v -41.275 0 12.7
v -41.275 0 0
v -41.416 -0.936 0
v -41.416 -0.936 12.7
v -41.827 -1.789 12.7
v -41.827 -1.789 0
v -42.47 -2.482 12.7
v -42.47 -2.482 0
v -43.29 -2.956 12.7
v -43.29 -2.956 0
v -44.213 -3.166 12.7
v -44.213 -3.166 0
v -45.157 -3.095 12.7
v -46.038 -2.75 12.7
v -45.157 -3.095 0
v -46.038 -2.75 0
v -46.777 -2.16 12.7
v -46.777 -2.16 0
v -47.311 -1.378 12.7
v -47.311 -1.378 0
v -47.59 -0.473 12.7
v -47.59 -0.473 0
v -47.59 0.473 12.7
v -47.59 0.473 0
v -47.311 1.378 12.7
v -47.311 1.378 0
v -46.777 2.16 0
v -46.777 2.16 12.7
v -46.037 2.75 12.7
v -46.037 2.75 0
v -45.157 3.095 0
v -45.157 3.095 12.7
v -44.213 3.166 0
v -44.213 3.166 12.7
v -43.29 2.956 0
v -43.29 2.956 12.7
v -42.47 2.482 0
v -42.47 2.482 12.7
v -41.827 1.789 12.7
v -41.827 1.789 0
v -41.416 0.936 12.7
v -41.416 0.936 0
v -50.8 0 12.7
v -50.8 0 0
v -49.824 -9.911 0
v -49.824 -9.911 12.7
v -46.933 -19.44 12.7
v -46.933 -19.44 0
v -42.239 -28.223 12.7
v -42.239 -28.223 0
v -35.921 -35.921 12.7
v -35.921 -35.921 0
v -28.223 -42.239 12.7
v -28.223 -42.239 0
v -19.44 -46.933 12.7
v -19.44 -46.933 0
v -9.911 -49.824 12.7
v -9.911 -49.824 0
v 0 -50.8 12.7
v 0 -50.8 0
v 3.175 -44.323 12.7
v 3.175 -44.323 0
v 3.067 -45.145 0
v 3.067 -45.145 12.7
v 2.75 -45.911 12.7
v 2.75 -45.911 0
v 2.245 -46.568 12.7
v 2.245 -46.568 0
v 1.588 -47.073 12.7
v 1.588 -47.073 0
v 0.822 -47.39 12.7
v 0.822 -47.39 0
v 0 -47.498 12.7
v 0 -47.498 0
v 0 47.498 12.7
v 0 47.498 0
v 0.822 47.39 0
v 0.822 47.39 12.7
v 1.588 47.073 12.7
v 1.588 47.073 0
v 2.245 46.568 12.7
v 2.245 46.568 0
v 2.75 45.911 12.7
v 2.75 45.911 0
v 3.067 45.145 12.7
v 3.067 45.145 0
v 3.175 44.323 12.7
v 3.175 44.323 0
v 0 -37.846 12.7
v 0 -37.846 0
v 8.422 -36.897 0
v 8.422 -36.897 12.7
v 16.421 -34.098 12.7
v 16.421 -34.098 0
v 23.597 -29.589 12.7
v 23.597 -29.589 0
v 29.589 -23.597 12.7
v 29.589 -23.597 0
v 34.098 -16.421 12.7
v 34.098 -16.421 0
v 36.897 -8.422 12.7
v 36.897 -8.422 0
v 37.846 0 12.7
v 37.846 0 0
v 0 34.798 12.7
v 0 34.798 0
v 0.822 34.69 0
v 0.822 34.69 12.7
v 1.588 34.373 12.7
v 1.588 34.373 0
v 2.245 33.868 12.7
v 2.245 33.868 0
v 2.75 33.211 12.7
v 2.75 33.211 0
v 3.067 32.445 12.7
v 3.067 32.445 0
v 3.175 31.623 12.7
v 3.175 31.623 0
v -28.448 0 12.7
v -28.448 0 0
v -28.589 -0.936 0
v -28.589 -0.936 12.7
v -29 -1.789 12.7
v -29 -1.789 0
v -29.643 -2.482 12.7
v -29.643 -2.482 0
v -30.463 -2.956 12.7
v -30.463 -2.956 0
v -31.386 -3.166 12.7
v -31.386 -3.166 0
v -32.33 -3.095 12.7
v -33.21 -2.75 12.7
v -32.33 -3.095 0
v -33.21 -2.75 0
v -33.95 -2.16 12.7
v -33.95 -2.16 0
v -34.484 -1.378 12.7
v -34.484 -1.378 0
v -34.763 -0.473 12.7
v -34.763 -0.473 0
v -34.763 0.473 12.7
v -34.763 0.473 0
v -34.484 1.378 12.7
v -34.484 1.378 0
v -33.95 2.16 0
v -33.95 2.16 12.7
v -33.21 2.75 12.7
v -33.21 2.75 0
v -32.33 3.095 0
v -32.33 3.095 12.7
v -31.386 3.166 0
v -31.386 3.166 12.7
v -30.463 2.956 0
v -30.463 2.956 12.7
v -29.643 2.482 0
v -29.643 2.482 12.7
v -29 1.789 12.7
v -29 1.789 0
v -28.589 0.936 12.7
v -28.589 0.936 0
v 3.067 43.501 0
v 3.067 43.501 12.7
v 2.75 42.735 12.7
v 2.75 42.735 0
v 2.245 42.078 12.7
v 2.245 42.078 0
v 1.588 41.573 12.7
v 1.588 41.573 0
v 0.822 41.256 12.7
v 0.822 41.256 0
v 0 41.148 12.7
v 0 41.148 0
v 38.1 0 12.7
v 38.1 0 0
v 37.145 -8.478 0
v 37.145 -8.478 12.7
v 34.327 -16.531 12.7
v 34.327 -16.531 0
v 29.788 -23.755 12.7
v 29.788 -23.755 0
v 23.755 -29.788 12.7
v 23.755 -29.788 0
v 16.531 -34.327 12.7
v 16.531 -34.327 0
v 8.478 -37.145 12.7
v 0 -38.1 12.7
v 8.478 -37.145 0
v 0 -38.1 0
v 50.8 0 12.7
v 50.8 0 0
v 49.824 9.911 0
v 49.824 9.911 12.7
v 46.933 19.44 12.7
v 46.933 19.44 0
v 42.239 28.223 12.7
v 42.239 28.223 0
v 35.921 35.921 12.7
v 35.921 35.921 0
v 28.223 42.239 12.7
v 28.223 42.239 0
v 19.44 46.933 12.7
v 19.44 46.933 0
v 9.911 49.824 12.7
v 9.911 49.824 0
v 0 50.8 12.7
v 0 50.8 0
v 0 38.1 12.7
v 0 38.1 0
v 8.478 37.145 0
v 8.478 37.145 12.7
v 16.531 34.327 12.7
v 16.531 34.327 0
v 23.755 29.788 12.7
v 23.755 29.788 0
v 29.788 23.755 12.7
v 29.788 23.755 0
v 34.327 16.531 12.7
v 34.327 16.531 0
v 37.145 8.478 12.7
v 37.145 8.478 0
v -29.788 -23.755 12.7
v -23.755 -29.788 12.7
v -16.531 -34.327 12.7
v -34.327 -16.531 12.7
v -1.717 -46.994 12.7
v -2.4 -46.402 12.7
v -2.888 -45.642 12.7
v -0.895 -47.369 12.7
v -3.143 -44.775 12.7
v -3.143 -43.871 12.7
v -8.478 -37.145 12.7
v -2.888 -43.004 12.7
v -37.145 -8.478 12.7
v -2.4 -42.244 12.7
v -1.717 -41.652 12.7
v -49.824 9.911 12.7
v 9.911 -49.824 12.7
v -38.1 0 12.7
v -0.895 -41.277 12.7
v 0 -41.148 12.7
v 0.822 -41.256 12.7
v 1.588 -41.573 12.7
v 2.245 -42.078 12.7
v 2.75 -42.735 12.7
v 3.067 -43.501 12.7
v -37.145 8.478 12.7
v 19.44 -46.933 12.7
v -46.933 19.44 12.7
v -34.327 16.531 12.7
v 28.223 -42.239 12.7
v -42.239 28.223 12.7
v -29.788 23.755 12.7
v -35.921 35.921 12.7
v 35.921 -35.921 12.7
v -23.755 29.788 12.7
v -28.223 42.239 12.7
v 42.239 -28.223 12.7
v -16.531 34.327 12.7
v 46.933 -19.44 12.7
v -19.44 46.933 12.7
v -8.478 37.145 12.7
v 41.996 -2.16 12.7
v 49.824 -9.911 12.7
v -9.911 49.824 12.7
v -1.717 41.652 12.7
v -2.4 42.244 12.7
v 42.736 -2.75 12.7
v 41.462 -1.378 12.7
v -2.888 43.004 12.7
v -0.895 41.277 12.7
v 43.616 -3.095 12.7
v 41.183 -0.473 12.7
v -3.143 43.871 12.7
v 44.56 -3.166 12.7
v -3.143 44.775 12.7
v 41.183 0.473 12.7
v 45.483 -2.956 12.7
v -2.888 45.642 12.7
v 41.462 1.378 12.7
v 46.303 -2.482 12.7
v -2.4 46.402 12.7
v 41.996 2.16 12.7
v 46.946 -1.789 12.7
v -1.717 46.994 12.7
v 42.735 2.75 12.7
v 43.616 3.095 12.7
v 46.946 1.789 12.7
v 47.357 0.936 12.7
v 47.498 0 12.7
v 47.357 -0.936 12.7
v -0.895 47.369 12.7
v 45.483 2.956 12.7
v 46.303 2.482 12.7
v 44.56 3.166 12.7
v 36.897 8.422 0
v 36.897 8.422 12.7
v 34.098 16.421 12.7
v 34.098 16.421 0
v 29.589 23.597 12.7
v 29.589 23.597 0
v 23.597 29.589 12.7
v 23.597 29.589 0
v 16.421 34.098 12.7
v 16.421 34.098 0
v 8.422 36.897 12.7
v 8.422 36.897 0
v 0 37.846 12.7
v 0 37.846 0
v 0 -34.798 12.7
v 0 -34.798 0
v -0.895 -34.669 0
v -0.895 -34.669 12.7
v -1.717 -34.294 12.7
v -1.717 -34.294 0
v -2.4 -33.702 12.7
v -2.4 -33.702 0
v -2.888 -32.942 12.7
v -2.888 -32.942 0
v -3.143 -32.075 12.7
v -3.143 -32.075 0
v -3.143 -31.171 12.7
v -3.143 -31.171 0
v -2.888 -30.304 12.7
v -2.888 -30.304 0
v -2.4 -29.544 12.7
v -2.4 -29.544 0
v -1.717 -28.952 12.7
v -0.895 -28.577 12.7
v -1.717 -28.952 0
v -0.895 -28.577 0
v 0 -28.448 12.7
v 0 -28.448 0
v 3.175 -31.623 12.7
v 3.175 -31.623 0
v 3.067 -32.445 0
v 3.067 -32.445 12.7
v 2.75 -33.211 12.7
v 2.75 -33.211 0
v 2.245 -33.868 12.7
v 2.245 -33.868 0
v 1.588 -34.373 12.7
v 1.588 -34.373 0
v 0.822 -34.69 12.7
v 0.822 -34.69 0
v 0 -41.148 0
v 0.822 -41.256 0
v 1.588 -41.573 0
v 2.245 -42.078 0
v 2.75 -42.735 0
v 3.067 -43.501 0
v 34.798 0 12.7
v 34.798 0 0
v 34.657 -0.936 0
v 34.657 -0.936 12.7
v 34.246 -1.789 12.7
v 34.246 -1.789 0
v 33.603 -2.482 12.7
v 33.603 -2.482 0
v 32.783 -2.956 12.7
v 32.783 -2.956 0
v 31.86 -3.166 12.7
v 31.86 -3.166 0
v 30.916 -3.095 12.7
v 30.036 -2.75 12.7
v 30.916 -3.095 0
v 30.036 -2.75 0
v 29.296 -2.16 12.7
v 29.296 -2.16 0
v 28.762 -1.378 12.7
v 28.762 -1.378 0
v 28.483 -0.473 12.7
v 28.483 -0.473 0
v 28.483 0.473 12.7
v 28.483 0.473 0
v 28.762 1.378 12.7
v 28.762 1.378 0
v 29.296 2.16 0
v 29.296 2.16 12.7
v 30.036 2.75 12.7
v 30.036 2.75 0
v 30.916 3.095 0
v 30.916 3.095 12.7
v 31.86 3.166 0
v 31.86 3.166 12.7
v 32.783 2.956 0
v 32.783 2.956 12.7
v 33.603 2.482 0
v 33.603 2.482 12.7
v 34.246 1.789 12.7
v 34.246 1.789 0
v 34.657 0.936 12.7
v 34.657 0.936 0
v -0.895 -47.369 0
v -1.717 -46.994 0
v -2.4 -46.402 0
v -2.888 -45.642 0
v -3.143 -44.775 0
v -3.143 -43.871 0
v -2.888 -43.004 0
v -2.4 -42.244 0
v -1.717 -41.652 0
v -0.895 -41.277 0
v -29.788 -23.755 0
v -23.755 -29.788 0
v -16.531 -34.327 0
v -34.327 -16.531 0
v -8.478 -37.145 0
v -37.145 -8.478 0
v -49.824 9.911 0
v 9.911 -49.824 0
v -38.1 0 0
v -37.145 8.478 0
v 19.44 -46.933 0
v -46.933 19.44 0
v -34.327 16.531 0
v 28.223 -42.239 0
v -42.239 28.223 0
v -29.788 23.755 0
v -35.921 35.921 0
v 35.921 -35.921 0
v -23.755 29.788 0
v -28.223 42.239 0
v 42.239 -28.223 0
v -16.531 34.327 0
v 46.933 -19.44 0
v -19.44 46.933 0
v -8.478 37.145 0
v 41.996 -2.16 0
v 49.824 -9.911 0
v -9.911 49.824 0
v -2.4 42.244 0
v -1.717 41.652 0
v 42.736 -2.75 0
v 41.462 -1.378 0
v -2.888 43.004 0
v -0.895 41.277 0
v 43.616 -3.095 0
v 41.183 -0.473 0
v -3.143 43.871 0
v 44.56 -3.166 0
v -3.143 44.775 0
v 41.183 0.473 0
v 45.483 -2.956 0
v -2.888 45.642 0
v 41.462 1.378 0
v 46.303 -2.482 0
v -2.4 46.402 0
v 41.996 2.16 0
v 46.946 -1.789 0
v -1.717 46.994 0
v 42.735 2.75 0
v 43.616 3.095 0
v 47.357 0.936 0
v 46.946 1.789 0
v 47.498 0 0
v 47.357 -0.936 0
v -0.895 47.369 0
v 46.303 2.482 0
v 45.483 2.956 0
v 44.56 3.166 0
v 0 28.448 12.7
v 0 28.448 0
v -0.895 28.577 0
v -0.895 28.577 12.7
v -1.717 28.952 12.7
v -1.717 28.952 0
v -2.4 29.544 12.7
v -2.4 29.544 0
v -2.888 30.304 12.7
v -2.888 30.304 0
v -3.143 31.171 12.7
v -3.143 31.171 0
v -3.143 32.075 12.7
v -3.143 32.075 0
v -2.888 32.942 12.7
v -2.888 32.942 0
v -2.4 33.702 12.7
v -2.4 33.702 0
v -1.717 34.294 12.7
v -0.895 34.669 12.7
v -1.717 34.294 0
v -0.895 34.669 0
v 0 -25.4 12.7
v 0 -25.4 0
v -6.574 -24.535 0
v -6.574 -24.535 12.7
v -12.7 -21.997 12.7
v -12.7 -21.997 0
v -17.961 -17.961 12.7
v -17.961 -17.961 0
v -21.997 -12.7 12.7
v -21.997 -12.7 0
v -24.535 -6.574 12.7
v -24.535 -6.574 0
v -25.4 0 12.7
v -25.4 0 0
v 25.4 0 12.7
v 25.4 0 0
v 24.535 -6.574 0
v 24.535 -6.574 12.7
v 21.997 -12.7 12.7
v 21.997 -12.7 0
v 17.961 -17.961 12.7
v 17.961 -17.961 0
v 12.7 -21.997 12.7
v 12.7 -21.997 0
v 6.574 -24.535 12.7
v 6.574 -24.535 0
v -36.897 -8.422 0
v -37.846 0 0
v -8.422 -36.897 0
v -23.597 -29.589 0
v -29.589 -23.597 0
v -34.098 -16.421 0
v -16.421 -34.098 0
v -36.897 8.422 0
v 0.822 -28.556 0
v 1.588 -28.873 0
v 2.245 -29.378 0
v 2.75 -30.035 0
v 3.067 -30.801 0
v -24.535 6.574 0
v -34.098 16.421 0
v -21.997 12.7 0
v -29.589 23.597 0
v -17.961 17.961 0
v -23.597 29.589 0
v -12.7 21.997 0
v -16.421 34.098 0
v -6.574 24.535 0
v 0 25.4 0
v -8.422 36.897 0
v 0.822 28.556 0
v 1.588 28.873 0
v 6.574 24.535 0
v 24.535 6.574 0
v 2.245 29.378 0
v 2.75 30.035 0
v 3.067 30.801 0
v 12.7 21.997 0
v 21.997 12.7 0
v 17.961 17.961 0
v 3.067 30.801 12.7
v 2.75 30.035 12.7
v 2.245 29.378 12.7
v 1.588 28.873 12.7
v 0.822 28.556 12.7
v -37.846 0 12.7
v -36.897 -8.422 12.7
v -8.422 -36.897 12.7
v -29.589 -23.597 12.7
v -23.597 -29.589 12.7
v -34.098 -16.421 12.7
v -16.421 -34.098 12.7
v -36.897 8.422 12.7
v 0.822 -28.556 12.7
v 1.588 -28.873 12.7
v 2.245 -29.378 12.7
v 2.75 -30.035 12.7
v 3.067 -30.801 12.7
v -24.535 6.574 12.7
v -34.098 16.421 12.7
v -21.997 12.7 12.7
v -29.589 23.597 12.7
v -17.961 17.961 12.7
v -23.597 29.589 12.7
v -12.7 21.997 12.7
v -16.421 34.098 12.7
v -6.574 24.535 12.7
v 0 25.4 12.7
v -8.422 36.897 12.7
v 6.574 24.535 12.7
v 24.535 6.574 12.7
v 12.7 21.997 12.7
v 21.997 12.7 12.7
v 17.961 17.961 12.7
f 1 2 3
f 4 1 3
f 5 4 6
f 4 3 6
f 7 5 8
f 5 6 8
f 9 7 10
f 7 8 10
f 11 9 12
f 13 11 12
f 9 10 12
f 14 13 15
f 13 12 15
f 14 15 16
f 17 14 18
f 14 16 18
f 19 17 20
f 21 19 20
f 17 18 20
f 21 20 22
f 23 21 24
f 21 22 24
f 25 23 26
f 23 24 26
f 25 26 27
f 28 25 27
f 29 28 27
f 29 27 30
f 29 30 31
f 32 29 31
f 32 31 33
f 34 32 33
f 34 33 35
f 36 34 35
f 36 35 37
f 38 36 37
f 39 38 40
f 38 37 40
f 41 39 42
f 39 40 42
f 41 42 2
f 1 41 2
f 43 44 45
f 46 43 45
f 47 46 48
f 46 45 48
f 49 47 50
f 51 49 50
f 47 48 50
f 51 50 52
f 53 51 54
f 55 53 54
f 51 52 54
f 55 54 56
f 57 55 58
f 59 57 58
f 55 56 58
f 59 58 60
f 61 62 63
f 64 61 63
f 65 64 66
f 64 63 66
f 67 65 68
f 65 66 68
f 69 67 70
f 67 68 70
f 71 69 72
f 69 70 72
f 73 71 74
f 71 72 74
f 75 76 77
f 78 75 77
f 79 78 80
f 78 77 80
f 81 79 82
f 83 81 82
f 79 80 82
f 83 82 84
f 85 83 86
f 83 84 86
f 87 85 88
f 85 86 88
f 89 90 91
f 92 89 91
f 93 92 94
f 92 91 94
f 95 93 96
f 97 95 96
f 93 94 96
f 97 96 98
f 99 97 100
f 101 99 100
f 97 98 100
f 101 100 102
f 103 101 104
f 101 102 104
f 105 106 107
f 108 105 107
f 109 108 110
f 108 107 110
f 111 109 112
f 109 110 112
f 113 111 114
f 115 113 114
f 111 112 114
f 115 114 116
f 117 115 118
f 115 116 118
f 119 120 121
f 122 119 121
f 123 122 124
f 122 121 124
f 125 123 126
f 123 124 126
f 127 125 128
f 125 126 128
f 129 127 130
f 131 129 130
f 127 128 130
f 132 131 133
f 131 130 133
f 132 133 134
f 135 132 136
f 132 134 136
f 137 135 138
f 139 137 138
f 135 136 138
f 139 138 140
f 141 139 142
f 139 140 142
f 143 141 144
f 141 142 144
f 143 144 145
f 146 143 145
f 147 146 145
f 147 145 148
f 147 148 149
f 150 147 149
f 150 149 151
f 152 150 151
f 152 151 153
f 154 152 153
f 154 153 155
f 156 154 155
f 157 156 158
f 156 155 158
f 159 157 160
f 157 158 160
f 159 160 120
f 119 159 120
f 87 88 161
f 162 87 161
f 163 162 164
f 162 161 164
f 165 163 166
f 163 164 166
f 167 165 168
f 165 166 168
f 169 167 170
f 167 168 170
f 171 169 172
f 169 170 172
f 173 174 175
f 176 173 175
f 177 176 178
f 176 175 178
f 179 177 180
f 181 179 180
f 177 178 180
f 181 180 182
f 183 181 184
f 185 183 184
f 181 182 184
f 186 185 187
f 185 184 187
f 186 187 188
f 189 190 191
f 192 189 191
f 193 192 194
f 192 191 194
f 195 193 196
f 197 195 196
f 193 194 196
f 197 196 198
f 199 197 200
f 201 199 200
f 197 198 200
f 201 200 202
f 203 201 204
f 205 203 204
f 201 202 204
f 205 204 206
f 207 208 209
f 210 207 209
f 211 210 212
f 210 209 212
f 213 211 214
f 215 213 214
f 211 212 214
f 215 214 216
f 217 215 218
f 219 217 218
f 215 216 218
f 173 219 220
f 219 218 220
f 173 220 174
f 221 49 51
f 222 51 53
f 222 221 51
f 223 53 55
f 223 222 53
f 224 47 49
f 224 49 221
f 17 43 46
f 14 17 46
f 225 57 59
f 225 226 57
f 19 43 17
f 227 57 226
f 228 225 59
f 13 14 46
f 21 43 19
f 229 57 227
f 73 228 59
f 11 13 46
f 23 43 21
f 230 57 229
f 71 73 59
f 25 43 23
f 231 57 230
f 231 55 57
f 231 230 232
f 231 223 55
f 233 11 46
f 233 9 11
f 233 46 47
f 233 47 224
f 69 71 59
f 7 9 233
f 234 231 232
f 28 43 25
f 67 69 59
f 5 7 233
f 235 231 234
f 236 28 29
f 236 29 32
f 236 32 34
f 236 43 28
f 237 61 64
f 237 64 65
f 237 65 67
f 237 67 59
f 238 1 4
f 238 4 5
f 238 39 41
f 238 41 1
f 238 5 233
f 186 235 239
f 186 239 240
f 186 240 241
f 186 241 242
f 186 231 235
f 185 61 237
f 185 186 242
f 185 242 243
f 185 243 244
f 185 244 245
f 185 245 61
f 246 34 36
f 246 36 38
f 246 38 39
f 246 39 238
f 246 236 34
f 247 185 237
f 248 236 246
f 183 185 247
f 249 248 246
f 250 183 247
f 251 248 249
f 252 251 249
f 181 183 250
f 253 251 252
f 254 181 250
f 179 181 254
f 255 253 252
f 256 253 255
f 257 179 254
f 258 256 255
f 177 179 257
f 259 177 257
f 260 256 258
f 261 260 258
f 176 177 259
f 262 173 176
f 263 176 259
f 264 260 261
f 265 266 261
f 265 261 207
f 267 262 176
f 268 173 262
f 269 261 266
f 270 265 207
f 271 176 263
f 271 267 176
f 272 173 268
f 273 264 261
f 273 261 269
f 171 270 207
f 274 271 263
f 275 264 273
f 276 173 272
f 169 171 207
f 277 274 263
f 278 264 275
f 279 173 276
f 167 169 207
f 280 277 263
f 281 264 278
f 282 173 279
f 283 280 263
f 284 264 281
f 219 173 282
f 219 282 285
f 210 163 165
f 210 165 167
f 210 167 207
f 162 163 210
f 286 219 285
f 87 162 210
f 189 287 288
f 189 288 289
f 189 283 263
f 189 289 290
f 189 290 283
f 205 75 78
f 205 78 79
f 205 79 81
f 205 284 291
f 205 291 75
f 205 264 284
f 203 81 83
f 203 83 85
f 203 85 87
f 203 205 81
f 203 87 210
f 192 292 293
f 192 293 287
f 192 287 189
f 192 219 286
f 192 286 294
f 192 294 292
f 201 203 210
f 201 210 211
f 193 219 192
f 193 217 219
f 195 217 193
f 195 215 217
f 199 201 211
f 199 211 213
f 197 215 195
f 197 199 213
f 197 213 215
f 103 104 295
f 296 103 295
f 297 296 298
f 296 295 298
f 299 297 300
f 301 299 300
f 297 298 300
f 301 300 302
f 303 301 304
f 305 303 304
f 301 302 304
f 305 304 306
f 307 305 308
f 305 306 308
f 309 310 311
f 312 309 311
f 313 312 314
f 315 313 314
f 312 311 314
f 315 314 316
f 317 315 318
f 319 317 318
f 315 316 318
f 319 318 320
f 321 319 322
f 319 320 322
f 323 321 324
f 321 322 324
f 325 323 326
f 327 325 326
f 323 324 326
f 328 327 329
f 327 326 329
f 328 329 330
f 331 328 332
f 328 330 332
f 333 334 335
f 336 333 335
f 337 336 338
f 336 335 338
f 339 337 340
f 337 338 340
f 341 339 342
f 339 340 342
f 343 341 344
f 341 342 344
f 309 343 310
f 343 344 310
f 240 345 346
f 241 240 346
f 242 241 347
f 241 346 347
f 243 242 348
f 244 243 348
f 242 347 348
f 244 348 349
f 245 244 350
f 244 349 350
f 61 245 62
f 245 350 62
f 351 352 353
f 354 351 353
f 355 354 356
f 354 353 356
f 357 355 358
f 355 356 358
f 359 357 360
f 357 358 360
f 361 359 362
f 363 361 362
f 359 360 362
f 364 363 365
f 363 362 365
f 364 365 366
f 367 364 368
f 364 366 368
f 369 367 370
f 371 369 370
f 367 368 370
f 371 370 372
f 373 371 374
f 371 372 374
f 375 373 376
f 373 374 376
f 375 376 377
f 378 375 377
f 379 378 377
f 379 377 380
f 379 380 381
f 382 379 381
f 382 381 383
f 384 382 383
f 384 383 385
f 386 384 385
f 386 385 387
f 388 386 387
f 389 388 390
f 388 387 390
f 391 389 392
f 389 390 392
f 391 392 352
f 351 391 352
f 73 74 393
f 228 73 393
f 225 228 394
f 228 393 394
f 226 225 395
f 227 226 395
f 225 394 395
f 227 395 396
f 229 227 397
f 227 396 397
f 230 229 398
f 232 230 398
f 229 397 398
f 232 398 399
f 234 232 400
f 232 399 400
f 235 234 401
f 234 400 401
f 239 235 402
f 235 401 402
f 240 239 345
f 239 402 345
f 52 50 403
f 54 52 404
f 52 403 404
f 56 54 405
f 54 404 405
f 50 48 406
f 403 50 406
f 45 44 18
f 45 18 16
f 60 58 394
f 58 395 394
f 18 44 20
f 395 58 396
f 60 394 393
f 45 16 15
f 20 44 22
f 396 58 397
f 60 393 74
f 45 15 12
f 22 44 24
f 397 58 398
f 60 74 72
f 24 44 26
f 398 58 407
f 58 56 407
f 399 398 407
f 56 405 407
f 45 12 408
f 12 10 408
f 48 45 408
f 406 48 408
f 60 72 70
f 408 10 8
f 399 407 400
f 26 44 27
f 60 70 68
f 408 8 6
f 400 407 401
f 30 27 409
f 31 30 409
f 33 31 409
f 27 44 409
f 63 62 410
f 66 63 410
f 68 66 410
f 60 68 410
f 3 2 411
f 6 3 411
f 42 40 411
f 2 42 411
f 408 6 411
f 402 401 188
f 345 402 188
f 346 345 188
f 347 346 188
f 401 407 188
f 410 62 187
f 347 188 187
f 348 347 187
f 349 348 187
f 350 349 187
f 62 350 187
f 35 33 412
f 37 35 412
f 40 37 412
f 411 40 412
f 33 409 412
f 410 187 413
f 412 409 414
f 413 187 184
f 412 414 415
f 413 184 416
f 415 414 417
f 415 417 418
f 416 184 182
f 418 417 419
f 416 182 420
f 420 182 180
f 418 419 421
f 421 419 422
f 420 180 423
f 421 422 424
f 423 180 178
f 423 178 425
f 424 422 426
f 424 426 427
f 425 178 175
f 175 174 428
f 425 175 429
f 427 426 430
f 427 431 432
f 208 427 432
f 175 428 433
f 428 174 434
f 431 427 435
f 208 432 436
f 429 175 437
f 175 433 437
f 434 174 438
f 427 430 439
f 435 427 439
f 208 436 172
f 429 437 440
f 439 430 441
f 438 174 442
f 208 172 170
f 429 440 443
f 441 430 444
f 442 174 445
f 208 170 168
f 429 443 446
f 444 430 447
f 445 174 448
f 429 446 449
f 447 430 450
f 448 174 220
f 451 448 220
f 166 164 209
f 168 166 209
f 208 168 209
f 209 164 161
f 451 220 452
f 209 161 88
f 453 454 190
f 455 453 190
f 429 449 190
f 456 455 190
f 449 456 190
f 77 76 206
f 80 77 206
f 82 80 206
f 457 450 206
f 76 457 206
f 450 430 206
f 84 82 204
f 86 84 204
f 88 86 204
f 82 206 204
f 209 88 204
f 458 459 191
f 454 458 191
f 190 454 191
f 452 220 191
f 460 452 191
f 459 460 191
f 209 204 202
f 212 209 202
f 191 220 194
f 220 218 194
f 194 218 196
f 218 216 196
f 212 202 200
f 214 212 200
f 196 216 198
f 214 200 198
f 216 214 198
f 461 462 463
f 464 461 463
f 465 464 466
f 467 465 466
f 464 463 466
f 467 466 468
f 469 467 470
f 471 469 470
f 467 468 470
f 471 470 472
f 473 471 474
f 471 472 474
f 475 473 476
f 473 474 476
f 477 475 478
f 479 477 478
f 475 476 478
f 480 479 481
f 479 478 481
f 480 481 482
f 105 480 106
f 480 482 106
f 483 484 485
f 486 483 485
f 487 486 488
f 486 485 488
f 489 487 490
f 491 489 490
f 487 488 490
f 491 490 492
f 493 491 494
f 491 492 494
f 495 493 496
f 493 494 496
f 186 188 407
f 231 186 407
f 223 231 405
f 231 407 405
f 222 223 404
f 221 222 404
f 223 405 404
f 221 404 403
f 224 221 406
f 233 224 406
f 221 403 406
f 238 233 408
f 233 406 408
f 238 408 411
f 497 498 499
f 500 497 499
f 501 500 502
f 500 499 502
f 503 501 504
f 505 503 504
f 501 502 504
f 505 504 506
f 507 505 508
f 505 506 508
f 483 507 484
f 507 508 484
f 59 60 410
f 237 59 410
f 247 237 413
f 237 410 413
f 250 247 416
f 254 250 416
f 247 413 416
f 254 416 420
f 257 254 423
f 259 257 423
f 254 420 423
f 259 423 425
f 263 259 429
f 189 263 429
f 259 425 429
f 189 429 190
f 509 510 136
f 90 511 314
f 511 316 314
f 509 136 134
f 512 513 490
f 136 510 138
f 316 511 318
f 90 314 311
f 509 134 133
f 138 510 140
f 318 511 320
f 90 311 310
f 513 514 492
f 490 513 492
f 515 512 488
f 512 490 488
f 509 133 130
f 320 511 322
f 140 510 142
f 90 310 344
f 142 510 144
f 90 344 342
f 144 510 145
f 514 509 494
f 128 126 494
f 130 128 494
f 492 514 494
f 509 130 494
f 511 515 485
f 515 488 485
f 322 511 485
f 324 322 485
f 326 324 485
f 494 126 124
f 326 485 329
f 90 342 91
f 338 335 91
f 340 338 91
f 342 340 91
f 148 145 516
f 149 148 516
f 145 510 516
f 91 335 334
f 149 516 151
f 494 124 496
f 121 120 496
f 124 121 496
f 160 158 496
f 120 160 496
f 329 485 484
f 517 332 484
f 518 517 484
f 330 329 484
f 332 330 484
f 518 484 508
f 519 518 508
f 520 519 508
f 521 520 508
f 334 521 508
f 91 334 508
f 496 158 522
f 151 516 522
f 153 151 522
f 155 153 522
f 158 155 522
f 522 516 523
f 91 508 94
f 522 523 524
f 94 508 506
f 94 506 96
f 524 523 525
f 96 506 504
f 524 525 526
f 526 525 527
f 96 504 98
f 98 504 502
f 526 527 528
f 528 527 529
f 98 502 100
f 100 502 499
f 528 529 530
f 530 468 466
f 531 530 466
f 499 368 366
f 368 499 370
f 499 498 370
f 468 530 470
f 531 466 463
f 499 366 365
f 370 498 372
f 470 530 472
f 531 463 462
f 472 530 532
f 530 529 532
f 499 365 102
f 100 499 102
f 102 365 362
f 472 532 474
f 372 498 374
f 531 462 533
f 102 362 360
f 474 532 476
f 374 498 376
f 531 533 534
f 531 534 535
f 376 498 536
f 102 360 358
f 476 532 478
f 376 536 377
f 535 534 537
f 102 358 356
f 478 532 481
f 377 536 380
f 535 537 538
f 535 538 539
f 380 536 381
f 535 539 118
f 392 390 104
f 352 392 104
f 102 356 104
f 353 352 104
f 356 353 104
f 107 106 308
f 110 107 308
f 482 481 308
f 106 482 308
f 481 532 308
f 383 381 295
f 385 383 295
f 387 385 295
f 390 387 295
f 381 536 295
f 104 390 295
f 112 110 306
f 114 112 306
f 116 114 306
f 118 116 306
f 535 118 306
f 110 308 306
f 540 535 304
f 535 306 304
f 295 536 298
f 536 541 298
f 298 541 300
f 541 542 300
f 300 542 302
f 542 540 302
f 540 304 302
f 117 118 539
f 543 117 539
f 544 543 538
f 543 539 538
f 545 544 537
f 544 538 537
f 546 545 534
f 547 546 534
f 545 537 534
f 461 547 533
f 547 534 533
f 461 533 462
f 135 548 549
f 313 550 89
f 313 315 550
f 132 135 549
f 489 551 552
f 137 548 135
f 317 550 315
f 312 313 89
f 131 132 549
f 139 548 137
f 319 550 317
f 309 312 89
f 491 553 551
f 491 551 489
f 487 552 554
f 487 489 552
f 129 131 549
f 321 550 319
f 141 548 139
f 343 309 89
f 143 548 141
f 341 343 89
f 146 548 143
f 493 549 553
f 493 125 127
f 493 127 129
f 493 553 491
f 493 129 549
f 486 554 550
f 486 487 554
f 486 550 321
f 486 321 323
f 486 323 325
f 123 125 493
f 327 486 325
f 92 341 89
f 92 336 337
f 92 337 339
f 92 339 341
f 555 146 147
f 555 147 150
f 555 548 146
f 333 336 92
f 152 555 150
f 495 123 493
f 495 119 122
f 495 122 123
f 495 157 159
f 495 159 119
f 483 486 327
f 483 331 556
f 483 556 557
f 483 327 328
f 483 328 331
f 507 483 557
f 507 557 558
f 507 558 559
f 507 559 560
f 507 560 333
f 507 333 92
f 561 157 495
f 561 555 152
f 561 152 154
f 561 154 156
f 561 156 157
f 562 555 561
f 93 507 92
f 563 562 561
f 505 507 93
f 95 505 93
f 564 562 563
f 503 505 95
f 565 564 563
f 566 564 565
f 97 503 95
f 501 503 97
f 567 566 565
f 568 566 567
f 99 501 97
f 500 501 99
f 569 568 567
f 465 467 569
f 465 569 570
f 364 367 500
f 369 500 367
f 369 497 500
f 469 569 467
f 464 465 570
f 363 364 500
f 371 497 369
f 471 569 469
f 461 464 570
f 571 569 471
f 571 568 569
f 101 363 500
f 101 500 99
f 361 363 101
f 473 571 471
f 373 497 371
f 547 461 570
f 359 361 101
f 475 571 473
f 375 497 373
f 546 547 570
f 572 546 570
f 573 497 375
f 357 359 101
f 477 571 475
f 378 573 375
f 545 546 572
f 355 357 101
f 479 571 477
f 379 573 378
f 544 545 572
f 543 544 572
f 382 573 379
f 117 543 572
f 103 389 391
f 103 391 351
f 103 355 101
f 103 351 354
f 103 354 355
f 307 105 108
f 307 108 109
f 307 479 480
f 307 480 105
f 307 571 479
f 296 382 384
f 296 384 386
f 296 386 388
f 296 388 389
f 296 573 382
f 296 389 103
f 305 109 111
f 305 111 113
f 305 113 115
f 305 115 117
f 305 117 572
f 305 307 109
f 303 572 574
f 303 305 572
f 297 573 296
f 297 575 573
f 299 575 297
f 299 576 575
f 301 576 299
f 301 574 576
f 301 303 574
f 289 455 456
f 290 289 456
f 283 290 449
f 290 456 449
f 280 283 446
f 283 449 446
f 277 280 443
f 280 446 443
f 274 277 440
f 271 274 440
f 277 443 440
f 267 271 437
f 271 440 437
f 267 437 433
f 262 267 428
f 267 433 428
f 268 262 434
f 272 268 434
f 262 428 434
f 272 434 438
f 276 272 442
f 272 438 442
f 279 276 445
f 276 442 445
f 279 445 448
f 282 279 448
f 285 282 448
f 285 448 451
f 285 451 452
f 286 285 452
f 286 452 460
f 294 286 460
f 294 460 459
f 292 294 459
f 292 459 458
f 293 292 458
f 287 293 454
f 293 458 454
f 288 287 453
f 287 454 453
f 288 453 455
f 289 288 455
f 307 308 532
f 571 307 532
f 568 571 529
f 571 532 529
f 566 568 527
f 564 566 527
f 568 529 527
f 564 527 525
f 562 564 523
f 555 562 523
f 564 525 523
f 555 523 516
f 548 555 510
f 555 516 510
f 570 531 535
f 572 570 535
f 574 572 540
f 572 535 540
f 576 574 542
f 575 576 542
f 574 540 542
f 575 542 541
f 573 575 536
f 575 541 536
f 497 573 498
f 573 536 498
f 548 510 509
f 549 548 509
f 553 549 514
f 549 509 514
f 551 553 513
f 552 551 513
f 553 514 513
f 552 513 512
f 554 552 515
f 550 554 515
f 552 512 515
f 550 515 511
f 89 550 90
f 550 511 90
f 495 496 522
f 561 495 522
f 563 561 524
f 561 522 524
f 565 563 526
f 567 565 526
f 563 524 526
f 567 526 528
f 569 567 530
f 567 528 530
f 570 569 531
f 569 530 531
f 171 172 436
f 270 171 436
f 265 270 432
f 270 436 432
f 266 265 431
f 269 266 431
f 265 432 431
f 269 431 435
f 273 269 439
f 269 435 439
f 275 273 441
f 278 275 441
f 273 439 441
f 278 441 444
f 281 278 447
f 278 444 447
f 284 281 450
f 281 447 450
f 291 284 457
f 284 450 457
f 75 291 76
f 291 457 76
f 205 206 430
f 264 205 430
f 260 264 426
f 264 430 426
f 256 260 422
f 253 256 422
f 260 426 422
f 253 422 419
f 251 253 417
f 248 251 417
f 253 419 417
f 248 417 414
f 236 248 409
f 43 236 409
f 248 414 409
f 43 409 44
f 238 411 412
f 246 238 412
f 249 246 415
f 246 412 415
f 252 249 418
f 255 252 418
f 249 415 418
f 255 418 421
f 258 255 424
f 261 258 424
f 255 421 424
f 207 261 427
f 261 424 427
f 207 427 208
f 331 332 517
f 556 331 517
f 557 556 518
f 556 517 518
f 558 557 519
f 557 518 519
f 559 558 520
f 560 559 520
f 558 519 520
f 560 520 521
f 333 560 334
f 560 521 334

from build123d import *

# Parameters (mm, degrees)
F1_DEPTH = 12.7


with BuildPart() as f1:
    # F0 (on Top) → F1 (new body)
    with BuildSketch(Plane.XY):
        with BuildLine():
            Line((34.798, 0), (37.846, 0))
            ThreePointArc((37.846, 0), (26.7611632408, 26.7611632408), (0, 37.846))
            Line((0, 37.846), (0, 34.798))
            ThreePointArc((0, 34.798), (2.2450640303, 33.8680640303), (3.175, 31.623))
            ThreePointArc((3.175, 31.623), (2.2450640303, 29.3779359697), (0, 28.448))
            Line((0, 28.448), (0, 25.4))
            ThreePointArc((0, 25.4), (17.9605122421, 17.9605122421), (25.4, 0))
            Line((25.4, 0), (28.448, 0))
            ThreePointArc((28.448, 0), (31.623, 3.175), (34.798, 0))
        make_face()
        with BuildLine():
            Line((0, 34.798), (0, 37.846))
            ThreePointArc((0, 37.846), (-26.7611632408, 26.7611632408), (-37.846, 0))
            Line((-37.846, 0), (-34.798, 0))
            ThreePointArc((-34.798, 0), (-31.623, 3.175), (-28.448, 0))
            Line((-28.448, 0), (-25.4, 0))
            ThreePointArc((-25.4, 0), (-17.9605122421, 17.9605122421), (0, 25.4))
            Line((0, 25.4), (0, 28.448))
            ThreePointArc((0, 28.448), (-3.175, 31.623), (0, 34.798))
        make_face()
        with BuildLine():
            ThreePointArc((0, -37.846), (26.7611632408, -26.7611632408), (37.846, 0))
            Line((37.846, 0), (34.798, 0))
            ThreePointArc((34.798, 0), (31.623, -3.175), (28.448, 0))
            Line((28.448, 0), (25.4, 0))
            ThreePointArc((25.4, 0), (17.9605122421, -17.9605122421), (0, -25.4))
            Line((0, -25.4), (0, -28.448))
            ThreePointArc((0, -28.448), (2.2450640303, -29.3779359697), (3.175, -31.623))
            ThreePointArc((3.175, -31.623), (2.2450640303, -33.8680640303), (0, -34.798))
            Line((0, -34.798), (0, -37.846))
        make_face()
        with BuildLine():
            ThreePointArc((-37.846, 0), (-26.7611632408, -26.7611632408), (0, -37.846))
            Line((0, -37.846), (0, -34.798))
            ThreePointArc((0, -34.798), (-3.175, -31.623), (0, -28.448))
            Line((0, -28.448), (0, -25.4))
            ThreePointArc((0, -25.4), (-17.9605122421, -17.9605122421), (-25.4, 0))
            Line((-25.4, 0), (-28.448, 0))
            ThreePointArc((-28.448, 0), (-31.623, -3.175), (-34.798, 0))
            Line((-34.798, 0), (-37.846, 0))
        make_face()
    extrude(amount=F1_DEPTH)


with BuildPart() as f1b:
    # F0 (on Top) → F1, piece 2 (new body)
    with BuildSketch(Plane.XY):
        with BuildLine():
            Line((47.498, 0), (50.8, 0))
            ThreePointArc((50.8, 0), (35.9210244843, 35.9210244843), (0, 50.8))
            Line((0, 50.8), (0, 47.498))
            ThreePointArc((0, 47.498), (2.2450640303, 46.5680640303), (3.175, 44.323))
            ThreePointArc((3.175, 44.323), (2.2450640303, 42.0779359697), (0, 41.148))
            Line((0, 41.148), (0, 38.1))
            ThreePointArc((0, 38.1), (26.9407683632, 26.9407683632), (38.1, 0))
            Line((38.1, 0), (41.148, 0))
            ThreePointArc((41.148, 0), (44.323, 3.175), (47.498, 0))
        make_face()
        with BuildLine():
            Line((0, 47.498), (0, 50.8))
            ThreePointArc((0, 50.8), (-35.9210244843, 35.9210244843), (-50.8, 0))
            Line((-50.8, 0), (-47.625, 0))
            ThreePointArc((-47.625, 0), (-44.45, 3.175), (-41.275, 0))
            Line((-41.275, 0), (-38.1, 0))
            ThreePointArc((-38.1, 0), (-26.9407683632, 26.9407683632), (0, 38.1))
            Line((0, 38.1), (0, 41.148))
            ThreePointArc((0, 41.148), (-3.175, 44.323), (0, 47.498))
        make_face()
        with BuildLine():
            ThreePointArc((-50.8, 0), (-35.9210244843, -35.9210244843), (0, -50.8))
            Line((0, -50.8), (0, -47.498))
            ThreePointArc((0, -47.498), (-3.175, -44.323), (0, -41.148))
            Line((0, -41.148), (0, -38.1))
            ThreePointArc((0, -38.1), (-26.9407683632, -26.9407683632), (-38.1, 0))
            Line((-38.1, 0), (-41.275, 0))
            ThreePointArc((-41.275, 0), (-44.45, -3.175), (-47.625, 0))
            Line((-47.625, 0), (-50.8, 0))
        make_face()
        with BuildLine():
            ThreePointArc((0, -50.8), (35.9210244843, -35.9210244843), (50.8, 0))
            Line((50.8, 0), (47.498, 0))
            ThreePointArc((47.498, 0), (44.323, -3.175), (41.148, 0))
            Line((41.148, 0), (38.1, 0))
            ThreePointArc((38.1, 0), (26.9407683632, -26.9407683632), (0, -38.1))
            Line((0, -38.1), (0, -41.148))
            ThreePointArc((0, -41.148), (2.2450640303, -42.0779359697), (3.175, -44.323))
            ThreePointArc((3.175, -44.323), (2.2450640303, -46.5680640303), (0, -47.498))
            Line((0, -47.498), (0, -50.8))
        make_face()
    extrude(amount=F1_DEPTH)


solid = Compound([f1.part, f1b.part])
